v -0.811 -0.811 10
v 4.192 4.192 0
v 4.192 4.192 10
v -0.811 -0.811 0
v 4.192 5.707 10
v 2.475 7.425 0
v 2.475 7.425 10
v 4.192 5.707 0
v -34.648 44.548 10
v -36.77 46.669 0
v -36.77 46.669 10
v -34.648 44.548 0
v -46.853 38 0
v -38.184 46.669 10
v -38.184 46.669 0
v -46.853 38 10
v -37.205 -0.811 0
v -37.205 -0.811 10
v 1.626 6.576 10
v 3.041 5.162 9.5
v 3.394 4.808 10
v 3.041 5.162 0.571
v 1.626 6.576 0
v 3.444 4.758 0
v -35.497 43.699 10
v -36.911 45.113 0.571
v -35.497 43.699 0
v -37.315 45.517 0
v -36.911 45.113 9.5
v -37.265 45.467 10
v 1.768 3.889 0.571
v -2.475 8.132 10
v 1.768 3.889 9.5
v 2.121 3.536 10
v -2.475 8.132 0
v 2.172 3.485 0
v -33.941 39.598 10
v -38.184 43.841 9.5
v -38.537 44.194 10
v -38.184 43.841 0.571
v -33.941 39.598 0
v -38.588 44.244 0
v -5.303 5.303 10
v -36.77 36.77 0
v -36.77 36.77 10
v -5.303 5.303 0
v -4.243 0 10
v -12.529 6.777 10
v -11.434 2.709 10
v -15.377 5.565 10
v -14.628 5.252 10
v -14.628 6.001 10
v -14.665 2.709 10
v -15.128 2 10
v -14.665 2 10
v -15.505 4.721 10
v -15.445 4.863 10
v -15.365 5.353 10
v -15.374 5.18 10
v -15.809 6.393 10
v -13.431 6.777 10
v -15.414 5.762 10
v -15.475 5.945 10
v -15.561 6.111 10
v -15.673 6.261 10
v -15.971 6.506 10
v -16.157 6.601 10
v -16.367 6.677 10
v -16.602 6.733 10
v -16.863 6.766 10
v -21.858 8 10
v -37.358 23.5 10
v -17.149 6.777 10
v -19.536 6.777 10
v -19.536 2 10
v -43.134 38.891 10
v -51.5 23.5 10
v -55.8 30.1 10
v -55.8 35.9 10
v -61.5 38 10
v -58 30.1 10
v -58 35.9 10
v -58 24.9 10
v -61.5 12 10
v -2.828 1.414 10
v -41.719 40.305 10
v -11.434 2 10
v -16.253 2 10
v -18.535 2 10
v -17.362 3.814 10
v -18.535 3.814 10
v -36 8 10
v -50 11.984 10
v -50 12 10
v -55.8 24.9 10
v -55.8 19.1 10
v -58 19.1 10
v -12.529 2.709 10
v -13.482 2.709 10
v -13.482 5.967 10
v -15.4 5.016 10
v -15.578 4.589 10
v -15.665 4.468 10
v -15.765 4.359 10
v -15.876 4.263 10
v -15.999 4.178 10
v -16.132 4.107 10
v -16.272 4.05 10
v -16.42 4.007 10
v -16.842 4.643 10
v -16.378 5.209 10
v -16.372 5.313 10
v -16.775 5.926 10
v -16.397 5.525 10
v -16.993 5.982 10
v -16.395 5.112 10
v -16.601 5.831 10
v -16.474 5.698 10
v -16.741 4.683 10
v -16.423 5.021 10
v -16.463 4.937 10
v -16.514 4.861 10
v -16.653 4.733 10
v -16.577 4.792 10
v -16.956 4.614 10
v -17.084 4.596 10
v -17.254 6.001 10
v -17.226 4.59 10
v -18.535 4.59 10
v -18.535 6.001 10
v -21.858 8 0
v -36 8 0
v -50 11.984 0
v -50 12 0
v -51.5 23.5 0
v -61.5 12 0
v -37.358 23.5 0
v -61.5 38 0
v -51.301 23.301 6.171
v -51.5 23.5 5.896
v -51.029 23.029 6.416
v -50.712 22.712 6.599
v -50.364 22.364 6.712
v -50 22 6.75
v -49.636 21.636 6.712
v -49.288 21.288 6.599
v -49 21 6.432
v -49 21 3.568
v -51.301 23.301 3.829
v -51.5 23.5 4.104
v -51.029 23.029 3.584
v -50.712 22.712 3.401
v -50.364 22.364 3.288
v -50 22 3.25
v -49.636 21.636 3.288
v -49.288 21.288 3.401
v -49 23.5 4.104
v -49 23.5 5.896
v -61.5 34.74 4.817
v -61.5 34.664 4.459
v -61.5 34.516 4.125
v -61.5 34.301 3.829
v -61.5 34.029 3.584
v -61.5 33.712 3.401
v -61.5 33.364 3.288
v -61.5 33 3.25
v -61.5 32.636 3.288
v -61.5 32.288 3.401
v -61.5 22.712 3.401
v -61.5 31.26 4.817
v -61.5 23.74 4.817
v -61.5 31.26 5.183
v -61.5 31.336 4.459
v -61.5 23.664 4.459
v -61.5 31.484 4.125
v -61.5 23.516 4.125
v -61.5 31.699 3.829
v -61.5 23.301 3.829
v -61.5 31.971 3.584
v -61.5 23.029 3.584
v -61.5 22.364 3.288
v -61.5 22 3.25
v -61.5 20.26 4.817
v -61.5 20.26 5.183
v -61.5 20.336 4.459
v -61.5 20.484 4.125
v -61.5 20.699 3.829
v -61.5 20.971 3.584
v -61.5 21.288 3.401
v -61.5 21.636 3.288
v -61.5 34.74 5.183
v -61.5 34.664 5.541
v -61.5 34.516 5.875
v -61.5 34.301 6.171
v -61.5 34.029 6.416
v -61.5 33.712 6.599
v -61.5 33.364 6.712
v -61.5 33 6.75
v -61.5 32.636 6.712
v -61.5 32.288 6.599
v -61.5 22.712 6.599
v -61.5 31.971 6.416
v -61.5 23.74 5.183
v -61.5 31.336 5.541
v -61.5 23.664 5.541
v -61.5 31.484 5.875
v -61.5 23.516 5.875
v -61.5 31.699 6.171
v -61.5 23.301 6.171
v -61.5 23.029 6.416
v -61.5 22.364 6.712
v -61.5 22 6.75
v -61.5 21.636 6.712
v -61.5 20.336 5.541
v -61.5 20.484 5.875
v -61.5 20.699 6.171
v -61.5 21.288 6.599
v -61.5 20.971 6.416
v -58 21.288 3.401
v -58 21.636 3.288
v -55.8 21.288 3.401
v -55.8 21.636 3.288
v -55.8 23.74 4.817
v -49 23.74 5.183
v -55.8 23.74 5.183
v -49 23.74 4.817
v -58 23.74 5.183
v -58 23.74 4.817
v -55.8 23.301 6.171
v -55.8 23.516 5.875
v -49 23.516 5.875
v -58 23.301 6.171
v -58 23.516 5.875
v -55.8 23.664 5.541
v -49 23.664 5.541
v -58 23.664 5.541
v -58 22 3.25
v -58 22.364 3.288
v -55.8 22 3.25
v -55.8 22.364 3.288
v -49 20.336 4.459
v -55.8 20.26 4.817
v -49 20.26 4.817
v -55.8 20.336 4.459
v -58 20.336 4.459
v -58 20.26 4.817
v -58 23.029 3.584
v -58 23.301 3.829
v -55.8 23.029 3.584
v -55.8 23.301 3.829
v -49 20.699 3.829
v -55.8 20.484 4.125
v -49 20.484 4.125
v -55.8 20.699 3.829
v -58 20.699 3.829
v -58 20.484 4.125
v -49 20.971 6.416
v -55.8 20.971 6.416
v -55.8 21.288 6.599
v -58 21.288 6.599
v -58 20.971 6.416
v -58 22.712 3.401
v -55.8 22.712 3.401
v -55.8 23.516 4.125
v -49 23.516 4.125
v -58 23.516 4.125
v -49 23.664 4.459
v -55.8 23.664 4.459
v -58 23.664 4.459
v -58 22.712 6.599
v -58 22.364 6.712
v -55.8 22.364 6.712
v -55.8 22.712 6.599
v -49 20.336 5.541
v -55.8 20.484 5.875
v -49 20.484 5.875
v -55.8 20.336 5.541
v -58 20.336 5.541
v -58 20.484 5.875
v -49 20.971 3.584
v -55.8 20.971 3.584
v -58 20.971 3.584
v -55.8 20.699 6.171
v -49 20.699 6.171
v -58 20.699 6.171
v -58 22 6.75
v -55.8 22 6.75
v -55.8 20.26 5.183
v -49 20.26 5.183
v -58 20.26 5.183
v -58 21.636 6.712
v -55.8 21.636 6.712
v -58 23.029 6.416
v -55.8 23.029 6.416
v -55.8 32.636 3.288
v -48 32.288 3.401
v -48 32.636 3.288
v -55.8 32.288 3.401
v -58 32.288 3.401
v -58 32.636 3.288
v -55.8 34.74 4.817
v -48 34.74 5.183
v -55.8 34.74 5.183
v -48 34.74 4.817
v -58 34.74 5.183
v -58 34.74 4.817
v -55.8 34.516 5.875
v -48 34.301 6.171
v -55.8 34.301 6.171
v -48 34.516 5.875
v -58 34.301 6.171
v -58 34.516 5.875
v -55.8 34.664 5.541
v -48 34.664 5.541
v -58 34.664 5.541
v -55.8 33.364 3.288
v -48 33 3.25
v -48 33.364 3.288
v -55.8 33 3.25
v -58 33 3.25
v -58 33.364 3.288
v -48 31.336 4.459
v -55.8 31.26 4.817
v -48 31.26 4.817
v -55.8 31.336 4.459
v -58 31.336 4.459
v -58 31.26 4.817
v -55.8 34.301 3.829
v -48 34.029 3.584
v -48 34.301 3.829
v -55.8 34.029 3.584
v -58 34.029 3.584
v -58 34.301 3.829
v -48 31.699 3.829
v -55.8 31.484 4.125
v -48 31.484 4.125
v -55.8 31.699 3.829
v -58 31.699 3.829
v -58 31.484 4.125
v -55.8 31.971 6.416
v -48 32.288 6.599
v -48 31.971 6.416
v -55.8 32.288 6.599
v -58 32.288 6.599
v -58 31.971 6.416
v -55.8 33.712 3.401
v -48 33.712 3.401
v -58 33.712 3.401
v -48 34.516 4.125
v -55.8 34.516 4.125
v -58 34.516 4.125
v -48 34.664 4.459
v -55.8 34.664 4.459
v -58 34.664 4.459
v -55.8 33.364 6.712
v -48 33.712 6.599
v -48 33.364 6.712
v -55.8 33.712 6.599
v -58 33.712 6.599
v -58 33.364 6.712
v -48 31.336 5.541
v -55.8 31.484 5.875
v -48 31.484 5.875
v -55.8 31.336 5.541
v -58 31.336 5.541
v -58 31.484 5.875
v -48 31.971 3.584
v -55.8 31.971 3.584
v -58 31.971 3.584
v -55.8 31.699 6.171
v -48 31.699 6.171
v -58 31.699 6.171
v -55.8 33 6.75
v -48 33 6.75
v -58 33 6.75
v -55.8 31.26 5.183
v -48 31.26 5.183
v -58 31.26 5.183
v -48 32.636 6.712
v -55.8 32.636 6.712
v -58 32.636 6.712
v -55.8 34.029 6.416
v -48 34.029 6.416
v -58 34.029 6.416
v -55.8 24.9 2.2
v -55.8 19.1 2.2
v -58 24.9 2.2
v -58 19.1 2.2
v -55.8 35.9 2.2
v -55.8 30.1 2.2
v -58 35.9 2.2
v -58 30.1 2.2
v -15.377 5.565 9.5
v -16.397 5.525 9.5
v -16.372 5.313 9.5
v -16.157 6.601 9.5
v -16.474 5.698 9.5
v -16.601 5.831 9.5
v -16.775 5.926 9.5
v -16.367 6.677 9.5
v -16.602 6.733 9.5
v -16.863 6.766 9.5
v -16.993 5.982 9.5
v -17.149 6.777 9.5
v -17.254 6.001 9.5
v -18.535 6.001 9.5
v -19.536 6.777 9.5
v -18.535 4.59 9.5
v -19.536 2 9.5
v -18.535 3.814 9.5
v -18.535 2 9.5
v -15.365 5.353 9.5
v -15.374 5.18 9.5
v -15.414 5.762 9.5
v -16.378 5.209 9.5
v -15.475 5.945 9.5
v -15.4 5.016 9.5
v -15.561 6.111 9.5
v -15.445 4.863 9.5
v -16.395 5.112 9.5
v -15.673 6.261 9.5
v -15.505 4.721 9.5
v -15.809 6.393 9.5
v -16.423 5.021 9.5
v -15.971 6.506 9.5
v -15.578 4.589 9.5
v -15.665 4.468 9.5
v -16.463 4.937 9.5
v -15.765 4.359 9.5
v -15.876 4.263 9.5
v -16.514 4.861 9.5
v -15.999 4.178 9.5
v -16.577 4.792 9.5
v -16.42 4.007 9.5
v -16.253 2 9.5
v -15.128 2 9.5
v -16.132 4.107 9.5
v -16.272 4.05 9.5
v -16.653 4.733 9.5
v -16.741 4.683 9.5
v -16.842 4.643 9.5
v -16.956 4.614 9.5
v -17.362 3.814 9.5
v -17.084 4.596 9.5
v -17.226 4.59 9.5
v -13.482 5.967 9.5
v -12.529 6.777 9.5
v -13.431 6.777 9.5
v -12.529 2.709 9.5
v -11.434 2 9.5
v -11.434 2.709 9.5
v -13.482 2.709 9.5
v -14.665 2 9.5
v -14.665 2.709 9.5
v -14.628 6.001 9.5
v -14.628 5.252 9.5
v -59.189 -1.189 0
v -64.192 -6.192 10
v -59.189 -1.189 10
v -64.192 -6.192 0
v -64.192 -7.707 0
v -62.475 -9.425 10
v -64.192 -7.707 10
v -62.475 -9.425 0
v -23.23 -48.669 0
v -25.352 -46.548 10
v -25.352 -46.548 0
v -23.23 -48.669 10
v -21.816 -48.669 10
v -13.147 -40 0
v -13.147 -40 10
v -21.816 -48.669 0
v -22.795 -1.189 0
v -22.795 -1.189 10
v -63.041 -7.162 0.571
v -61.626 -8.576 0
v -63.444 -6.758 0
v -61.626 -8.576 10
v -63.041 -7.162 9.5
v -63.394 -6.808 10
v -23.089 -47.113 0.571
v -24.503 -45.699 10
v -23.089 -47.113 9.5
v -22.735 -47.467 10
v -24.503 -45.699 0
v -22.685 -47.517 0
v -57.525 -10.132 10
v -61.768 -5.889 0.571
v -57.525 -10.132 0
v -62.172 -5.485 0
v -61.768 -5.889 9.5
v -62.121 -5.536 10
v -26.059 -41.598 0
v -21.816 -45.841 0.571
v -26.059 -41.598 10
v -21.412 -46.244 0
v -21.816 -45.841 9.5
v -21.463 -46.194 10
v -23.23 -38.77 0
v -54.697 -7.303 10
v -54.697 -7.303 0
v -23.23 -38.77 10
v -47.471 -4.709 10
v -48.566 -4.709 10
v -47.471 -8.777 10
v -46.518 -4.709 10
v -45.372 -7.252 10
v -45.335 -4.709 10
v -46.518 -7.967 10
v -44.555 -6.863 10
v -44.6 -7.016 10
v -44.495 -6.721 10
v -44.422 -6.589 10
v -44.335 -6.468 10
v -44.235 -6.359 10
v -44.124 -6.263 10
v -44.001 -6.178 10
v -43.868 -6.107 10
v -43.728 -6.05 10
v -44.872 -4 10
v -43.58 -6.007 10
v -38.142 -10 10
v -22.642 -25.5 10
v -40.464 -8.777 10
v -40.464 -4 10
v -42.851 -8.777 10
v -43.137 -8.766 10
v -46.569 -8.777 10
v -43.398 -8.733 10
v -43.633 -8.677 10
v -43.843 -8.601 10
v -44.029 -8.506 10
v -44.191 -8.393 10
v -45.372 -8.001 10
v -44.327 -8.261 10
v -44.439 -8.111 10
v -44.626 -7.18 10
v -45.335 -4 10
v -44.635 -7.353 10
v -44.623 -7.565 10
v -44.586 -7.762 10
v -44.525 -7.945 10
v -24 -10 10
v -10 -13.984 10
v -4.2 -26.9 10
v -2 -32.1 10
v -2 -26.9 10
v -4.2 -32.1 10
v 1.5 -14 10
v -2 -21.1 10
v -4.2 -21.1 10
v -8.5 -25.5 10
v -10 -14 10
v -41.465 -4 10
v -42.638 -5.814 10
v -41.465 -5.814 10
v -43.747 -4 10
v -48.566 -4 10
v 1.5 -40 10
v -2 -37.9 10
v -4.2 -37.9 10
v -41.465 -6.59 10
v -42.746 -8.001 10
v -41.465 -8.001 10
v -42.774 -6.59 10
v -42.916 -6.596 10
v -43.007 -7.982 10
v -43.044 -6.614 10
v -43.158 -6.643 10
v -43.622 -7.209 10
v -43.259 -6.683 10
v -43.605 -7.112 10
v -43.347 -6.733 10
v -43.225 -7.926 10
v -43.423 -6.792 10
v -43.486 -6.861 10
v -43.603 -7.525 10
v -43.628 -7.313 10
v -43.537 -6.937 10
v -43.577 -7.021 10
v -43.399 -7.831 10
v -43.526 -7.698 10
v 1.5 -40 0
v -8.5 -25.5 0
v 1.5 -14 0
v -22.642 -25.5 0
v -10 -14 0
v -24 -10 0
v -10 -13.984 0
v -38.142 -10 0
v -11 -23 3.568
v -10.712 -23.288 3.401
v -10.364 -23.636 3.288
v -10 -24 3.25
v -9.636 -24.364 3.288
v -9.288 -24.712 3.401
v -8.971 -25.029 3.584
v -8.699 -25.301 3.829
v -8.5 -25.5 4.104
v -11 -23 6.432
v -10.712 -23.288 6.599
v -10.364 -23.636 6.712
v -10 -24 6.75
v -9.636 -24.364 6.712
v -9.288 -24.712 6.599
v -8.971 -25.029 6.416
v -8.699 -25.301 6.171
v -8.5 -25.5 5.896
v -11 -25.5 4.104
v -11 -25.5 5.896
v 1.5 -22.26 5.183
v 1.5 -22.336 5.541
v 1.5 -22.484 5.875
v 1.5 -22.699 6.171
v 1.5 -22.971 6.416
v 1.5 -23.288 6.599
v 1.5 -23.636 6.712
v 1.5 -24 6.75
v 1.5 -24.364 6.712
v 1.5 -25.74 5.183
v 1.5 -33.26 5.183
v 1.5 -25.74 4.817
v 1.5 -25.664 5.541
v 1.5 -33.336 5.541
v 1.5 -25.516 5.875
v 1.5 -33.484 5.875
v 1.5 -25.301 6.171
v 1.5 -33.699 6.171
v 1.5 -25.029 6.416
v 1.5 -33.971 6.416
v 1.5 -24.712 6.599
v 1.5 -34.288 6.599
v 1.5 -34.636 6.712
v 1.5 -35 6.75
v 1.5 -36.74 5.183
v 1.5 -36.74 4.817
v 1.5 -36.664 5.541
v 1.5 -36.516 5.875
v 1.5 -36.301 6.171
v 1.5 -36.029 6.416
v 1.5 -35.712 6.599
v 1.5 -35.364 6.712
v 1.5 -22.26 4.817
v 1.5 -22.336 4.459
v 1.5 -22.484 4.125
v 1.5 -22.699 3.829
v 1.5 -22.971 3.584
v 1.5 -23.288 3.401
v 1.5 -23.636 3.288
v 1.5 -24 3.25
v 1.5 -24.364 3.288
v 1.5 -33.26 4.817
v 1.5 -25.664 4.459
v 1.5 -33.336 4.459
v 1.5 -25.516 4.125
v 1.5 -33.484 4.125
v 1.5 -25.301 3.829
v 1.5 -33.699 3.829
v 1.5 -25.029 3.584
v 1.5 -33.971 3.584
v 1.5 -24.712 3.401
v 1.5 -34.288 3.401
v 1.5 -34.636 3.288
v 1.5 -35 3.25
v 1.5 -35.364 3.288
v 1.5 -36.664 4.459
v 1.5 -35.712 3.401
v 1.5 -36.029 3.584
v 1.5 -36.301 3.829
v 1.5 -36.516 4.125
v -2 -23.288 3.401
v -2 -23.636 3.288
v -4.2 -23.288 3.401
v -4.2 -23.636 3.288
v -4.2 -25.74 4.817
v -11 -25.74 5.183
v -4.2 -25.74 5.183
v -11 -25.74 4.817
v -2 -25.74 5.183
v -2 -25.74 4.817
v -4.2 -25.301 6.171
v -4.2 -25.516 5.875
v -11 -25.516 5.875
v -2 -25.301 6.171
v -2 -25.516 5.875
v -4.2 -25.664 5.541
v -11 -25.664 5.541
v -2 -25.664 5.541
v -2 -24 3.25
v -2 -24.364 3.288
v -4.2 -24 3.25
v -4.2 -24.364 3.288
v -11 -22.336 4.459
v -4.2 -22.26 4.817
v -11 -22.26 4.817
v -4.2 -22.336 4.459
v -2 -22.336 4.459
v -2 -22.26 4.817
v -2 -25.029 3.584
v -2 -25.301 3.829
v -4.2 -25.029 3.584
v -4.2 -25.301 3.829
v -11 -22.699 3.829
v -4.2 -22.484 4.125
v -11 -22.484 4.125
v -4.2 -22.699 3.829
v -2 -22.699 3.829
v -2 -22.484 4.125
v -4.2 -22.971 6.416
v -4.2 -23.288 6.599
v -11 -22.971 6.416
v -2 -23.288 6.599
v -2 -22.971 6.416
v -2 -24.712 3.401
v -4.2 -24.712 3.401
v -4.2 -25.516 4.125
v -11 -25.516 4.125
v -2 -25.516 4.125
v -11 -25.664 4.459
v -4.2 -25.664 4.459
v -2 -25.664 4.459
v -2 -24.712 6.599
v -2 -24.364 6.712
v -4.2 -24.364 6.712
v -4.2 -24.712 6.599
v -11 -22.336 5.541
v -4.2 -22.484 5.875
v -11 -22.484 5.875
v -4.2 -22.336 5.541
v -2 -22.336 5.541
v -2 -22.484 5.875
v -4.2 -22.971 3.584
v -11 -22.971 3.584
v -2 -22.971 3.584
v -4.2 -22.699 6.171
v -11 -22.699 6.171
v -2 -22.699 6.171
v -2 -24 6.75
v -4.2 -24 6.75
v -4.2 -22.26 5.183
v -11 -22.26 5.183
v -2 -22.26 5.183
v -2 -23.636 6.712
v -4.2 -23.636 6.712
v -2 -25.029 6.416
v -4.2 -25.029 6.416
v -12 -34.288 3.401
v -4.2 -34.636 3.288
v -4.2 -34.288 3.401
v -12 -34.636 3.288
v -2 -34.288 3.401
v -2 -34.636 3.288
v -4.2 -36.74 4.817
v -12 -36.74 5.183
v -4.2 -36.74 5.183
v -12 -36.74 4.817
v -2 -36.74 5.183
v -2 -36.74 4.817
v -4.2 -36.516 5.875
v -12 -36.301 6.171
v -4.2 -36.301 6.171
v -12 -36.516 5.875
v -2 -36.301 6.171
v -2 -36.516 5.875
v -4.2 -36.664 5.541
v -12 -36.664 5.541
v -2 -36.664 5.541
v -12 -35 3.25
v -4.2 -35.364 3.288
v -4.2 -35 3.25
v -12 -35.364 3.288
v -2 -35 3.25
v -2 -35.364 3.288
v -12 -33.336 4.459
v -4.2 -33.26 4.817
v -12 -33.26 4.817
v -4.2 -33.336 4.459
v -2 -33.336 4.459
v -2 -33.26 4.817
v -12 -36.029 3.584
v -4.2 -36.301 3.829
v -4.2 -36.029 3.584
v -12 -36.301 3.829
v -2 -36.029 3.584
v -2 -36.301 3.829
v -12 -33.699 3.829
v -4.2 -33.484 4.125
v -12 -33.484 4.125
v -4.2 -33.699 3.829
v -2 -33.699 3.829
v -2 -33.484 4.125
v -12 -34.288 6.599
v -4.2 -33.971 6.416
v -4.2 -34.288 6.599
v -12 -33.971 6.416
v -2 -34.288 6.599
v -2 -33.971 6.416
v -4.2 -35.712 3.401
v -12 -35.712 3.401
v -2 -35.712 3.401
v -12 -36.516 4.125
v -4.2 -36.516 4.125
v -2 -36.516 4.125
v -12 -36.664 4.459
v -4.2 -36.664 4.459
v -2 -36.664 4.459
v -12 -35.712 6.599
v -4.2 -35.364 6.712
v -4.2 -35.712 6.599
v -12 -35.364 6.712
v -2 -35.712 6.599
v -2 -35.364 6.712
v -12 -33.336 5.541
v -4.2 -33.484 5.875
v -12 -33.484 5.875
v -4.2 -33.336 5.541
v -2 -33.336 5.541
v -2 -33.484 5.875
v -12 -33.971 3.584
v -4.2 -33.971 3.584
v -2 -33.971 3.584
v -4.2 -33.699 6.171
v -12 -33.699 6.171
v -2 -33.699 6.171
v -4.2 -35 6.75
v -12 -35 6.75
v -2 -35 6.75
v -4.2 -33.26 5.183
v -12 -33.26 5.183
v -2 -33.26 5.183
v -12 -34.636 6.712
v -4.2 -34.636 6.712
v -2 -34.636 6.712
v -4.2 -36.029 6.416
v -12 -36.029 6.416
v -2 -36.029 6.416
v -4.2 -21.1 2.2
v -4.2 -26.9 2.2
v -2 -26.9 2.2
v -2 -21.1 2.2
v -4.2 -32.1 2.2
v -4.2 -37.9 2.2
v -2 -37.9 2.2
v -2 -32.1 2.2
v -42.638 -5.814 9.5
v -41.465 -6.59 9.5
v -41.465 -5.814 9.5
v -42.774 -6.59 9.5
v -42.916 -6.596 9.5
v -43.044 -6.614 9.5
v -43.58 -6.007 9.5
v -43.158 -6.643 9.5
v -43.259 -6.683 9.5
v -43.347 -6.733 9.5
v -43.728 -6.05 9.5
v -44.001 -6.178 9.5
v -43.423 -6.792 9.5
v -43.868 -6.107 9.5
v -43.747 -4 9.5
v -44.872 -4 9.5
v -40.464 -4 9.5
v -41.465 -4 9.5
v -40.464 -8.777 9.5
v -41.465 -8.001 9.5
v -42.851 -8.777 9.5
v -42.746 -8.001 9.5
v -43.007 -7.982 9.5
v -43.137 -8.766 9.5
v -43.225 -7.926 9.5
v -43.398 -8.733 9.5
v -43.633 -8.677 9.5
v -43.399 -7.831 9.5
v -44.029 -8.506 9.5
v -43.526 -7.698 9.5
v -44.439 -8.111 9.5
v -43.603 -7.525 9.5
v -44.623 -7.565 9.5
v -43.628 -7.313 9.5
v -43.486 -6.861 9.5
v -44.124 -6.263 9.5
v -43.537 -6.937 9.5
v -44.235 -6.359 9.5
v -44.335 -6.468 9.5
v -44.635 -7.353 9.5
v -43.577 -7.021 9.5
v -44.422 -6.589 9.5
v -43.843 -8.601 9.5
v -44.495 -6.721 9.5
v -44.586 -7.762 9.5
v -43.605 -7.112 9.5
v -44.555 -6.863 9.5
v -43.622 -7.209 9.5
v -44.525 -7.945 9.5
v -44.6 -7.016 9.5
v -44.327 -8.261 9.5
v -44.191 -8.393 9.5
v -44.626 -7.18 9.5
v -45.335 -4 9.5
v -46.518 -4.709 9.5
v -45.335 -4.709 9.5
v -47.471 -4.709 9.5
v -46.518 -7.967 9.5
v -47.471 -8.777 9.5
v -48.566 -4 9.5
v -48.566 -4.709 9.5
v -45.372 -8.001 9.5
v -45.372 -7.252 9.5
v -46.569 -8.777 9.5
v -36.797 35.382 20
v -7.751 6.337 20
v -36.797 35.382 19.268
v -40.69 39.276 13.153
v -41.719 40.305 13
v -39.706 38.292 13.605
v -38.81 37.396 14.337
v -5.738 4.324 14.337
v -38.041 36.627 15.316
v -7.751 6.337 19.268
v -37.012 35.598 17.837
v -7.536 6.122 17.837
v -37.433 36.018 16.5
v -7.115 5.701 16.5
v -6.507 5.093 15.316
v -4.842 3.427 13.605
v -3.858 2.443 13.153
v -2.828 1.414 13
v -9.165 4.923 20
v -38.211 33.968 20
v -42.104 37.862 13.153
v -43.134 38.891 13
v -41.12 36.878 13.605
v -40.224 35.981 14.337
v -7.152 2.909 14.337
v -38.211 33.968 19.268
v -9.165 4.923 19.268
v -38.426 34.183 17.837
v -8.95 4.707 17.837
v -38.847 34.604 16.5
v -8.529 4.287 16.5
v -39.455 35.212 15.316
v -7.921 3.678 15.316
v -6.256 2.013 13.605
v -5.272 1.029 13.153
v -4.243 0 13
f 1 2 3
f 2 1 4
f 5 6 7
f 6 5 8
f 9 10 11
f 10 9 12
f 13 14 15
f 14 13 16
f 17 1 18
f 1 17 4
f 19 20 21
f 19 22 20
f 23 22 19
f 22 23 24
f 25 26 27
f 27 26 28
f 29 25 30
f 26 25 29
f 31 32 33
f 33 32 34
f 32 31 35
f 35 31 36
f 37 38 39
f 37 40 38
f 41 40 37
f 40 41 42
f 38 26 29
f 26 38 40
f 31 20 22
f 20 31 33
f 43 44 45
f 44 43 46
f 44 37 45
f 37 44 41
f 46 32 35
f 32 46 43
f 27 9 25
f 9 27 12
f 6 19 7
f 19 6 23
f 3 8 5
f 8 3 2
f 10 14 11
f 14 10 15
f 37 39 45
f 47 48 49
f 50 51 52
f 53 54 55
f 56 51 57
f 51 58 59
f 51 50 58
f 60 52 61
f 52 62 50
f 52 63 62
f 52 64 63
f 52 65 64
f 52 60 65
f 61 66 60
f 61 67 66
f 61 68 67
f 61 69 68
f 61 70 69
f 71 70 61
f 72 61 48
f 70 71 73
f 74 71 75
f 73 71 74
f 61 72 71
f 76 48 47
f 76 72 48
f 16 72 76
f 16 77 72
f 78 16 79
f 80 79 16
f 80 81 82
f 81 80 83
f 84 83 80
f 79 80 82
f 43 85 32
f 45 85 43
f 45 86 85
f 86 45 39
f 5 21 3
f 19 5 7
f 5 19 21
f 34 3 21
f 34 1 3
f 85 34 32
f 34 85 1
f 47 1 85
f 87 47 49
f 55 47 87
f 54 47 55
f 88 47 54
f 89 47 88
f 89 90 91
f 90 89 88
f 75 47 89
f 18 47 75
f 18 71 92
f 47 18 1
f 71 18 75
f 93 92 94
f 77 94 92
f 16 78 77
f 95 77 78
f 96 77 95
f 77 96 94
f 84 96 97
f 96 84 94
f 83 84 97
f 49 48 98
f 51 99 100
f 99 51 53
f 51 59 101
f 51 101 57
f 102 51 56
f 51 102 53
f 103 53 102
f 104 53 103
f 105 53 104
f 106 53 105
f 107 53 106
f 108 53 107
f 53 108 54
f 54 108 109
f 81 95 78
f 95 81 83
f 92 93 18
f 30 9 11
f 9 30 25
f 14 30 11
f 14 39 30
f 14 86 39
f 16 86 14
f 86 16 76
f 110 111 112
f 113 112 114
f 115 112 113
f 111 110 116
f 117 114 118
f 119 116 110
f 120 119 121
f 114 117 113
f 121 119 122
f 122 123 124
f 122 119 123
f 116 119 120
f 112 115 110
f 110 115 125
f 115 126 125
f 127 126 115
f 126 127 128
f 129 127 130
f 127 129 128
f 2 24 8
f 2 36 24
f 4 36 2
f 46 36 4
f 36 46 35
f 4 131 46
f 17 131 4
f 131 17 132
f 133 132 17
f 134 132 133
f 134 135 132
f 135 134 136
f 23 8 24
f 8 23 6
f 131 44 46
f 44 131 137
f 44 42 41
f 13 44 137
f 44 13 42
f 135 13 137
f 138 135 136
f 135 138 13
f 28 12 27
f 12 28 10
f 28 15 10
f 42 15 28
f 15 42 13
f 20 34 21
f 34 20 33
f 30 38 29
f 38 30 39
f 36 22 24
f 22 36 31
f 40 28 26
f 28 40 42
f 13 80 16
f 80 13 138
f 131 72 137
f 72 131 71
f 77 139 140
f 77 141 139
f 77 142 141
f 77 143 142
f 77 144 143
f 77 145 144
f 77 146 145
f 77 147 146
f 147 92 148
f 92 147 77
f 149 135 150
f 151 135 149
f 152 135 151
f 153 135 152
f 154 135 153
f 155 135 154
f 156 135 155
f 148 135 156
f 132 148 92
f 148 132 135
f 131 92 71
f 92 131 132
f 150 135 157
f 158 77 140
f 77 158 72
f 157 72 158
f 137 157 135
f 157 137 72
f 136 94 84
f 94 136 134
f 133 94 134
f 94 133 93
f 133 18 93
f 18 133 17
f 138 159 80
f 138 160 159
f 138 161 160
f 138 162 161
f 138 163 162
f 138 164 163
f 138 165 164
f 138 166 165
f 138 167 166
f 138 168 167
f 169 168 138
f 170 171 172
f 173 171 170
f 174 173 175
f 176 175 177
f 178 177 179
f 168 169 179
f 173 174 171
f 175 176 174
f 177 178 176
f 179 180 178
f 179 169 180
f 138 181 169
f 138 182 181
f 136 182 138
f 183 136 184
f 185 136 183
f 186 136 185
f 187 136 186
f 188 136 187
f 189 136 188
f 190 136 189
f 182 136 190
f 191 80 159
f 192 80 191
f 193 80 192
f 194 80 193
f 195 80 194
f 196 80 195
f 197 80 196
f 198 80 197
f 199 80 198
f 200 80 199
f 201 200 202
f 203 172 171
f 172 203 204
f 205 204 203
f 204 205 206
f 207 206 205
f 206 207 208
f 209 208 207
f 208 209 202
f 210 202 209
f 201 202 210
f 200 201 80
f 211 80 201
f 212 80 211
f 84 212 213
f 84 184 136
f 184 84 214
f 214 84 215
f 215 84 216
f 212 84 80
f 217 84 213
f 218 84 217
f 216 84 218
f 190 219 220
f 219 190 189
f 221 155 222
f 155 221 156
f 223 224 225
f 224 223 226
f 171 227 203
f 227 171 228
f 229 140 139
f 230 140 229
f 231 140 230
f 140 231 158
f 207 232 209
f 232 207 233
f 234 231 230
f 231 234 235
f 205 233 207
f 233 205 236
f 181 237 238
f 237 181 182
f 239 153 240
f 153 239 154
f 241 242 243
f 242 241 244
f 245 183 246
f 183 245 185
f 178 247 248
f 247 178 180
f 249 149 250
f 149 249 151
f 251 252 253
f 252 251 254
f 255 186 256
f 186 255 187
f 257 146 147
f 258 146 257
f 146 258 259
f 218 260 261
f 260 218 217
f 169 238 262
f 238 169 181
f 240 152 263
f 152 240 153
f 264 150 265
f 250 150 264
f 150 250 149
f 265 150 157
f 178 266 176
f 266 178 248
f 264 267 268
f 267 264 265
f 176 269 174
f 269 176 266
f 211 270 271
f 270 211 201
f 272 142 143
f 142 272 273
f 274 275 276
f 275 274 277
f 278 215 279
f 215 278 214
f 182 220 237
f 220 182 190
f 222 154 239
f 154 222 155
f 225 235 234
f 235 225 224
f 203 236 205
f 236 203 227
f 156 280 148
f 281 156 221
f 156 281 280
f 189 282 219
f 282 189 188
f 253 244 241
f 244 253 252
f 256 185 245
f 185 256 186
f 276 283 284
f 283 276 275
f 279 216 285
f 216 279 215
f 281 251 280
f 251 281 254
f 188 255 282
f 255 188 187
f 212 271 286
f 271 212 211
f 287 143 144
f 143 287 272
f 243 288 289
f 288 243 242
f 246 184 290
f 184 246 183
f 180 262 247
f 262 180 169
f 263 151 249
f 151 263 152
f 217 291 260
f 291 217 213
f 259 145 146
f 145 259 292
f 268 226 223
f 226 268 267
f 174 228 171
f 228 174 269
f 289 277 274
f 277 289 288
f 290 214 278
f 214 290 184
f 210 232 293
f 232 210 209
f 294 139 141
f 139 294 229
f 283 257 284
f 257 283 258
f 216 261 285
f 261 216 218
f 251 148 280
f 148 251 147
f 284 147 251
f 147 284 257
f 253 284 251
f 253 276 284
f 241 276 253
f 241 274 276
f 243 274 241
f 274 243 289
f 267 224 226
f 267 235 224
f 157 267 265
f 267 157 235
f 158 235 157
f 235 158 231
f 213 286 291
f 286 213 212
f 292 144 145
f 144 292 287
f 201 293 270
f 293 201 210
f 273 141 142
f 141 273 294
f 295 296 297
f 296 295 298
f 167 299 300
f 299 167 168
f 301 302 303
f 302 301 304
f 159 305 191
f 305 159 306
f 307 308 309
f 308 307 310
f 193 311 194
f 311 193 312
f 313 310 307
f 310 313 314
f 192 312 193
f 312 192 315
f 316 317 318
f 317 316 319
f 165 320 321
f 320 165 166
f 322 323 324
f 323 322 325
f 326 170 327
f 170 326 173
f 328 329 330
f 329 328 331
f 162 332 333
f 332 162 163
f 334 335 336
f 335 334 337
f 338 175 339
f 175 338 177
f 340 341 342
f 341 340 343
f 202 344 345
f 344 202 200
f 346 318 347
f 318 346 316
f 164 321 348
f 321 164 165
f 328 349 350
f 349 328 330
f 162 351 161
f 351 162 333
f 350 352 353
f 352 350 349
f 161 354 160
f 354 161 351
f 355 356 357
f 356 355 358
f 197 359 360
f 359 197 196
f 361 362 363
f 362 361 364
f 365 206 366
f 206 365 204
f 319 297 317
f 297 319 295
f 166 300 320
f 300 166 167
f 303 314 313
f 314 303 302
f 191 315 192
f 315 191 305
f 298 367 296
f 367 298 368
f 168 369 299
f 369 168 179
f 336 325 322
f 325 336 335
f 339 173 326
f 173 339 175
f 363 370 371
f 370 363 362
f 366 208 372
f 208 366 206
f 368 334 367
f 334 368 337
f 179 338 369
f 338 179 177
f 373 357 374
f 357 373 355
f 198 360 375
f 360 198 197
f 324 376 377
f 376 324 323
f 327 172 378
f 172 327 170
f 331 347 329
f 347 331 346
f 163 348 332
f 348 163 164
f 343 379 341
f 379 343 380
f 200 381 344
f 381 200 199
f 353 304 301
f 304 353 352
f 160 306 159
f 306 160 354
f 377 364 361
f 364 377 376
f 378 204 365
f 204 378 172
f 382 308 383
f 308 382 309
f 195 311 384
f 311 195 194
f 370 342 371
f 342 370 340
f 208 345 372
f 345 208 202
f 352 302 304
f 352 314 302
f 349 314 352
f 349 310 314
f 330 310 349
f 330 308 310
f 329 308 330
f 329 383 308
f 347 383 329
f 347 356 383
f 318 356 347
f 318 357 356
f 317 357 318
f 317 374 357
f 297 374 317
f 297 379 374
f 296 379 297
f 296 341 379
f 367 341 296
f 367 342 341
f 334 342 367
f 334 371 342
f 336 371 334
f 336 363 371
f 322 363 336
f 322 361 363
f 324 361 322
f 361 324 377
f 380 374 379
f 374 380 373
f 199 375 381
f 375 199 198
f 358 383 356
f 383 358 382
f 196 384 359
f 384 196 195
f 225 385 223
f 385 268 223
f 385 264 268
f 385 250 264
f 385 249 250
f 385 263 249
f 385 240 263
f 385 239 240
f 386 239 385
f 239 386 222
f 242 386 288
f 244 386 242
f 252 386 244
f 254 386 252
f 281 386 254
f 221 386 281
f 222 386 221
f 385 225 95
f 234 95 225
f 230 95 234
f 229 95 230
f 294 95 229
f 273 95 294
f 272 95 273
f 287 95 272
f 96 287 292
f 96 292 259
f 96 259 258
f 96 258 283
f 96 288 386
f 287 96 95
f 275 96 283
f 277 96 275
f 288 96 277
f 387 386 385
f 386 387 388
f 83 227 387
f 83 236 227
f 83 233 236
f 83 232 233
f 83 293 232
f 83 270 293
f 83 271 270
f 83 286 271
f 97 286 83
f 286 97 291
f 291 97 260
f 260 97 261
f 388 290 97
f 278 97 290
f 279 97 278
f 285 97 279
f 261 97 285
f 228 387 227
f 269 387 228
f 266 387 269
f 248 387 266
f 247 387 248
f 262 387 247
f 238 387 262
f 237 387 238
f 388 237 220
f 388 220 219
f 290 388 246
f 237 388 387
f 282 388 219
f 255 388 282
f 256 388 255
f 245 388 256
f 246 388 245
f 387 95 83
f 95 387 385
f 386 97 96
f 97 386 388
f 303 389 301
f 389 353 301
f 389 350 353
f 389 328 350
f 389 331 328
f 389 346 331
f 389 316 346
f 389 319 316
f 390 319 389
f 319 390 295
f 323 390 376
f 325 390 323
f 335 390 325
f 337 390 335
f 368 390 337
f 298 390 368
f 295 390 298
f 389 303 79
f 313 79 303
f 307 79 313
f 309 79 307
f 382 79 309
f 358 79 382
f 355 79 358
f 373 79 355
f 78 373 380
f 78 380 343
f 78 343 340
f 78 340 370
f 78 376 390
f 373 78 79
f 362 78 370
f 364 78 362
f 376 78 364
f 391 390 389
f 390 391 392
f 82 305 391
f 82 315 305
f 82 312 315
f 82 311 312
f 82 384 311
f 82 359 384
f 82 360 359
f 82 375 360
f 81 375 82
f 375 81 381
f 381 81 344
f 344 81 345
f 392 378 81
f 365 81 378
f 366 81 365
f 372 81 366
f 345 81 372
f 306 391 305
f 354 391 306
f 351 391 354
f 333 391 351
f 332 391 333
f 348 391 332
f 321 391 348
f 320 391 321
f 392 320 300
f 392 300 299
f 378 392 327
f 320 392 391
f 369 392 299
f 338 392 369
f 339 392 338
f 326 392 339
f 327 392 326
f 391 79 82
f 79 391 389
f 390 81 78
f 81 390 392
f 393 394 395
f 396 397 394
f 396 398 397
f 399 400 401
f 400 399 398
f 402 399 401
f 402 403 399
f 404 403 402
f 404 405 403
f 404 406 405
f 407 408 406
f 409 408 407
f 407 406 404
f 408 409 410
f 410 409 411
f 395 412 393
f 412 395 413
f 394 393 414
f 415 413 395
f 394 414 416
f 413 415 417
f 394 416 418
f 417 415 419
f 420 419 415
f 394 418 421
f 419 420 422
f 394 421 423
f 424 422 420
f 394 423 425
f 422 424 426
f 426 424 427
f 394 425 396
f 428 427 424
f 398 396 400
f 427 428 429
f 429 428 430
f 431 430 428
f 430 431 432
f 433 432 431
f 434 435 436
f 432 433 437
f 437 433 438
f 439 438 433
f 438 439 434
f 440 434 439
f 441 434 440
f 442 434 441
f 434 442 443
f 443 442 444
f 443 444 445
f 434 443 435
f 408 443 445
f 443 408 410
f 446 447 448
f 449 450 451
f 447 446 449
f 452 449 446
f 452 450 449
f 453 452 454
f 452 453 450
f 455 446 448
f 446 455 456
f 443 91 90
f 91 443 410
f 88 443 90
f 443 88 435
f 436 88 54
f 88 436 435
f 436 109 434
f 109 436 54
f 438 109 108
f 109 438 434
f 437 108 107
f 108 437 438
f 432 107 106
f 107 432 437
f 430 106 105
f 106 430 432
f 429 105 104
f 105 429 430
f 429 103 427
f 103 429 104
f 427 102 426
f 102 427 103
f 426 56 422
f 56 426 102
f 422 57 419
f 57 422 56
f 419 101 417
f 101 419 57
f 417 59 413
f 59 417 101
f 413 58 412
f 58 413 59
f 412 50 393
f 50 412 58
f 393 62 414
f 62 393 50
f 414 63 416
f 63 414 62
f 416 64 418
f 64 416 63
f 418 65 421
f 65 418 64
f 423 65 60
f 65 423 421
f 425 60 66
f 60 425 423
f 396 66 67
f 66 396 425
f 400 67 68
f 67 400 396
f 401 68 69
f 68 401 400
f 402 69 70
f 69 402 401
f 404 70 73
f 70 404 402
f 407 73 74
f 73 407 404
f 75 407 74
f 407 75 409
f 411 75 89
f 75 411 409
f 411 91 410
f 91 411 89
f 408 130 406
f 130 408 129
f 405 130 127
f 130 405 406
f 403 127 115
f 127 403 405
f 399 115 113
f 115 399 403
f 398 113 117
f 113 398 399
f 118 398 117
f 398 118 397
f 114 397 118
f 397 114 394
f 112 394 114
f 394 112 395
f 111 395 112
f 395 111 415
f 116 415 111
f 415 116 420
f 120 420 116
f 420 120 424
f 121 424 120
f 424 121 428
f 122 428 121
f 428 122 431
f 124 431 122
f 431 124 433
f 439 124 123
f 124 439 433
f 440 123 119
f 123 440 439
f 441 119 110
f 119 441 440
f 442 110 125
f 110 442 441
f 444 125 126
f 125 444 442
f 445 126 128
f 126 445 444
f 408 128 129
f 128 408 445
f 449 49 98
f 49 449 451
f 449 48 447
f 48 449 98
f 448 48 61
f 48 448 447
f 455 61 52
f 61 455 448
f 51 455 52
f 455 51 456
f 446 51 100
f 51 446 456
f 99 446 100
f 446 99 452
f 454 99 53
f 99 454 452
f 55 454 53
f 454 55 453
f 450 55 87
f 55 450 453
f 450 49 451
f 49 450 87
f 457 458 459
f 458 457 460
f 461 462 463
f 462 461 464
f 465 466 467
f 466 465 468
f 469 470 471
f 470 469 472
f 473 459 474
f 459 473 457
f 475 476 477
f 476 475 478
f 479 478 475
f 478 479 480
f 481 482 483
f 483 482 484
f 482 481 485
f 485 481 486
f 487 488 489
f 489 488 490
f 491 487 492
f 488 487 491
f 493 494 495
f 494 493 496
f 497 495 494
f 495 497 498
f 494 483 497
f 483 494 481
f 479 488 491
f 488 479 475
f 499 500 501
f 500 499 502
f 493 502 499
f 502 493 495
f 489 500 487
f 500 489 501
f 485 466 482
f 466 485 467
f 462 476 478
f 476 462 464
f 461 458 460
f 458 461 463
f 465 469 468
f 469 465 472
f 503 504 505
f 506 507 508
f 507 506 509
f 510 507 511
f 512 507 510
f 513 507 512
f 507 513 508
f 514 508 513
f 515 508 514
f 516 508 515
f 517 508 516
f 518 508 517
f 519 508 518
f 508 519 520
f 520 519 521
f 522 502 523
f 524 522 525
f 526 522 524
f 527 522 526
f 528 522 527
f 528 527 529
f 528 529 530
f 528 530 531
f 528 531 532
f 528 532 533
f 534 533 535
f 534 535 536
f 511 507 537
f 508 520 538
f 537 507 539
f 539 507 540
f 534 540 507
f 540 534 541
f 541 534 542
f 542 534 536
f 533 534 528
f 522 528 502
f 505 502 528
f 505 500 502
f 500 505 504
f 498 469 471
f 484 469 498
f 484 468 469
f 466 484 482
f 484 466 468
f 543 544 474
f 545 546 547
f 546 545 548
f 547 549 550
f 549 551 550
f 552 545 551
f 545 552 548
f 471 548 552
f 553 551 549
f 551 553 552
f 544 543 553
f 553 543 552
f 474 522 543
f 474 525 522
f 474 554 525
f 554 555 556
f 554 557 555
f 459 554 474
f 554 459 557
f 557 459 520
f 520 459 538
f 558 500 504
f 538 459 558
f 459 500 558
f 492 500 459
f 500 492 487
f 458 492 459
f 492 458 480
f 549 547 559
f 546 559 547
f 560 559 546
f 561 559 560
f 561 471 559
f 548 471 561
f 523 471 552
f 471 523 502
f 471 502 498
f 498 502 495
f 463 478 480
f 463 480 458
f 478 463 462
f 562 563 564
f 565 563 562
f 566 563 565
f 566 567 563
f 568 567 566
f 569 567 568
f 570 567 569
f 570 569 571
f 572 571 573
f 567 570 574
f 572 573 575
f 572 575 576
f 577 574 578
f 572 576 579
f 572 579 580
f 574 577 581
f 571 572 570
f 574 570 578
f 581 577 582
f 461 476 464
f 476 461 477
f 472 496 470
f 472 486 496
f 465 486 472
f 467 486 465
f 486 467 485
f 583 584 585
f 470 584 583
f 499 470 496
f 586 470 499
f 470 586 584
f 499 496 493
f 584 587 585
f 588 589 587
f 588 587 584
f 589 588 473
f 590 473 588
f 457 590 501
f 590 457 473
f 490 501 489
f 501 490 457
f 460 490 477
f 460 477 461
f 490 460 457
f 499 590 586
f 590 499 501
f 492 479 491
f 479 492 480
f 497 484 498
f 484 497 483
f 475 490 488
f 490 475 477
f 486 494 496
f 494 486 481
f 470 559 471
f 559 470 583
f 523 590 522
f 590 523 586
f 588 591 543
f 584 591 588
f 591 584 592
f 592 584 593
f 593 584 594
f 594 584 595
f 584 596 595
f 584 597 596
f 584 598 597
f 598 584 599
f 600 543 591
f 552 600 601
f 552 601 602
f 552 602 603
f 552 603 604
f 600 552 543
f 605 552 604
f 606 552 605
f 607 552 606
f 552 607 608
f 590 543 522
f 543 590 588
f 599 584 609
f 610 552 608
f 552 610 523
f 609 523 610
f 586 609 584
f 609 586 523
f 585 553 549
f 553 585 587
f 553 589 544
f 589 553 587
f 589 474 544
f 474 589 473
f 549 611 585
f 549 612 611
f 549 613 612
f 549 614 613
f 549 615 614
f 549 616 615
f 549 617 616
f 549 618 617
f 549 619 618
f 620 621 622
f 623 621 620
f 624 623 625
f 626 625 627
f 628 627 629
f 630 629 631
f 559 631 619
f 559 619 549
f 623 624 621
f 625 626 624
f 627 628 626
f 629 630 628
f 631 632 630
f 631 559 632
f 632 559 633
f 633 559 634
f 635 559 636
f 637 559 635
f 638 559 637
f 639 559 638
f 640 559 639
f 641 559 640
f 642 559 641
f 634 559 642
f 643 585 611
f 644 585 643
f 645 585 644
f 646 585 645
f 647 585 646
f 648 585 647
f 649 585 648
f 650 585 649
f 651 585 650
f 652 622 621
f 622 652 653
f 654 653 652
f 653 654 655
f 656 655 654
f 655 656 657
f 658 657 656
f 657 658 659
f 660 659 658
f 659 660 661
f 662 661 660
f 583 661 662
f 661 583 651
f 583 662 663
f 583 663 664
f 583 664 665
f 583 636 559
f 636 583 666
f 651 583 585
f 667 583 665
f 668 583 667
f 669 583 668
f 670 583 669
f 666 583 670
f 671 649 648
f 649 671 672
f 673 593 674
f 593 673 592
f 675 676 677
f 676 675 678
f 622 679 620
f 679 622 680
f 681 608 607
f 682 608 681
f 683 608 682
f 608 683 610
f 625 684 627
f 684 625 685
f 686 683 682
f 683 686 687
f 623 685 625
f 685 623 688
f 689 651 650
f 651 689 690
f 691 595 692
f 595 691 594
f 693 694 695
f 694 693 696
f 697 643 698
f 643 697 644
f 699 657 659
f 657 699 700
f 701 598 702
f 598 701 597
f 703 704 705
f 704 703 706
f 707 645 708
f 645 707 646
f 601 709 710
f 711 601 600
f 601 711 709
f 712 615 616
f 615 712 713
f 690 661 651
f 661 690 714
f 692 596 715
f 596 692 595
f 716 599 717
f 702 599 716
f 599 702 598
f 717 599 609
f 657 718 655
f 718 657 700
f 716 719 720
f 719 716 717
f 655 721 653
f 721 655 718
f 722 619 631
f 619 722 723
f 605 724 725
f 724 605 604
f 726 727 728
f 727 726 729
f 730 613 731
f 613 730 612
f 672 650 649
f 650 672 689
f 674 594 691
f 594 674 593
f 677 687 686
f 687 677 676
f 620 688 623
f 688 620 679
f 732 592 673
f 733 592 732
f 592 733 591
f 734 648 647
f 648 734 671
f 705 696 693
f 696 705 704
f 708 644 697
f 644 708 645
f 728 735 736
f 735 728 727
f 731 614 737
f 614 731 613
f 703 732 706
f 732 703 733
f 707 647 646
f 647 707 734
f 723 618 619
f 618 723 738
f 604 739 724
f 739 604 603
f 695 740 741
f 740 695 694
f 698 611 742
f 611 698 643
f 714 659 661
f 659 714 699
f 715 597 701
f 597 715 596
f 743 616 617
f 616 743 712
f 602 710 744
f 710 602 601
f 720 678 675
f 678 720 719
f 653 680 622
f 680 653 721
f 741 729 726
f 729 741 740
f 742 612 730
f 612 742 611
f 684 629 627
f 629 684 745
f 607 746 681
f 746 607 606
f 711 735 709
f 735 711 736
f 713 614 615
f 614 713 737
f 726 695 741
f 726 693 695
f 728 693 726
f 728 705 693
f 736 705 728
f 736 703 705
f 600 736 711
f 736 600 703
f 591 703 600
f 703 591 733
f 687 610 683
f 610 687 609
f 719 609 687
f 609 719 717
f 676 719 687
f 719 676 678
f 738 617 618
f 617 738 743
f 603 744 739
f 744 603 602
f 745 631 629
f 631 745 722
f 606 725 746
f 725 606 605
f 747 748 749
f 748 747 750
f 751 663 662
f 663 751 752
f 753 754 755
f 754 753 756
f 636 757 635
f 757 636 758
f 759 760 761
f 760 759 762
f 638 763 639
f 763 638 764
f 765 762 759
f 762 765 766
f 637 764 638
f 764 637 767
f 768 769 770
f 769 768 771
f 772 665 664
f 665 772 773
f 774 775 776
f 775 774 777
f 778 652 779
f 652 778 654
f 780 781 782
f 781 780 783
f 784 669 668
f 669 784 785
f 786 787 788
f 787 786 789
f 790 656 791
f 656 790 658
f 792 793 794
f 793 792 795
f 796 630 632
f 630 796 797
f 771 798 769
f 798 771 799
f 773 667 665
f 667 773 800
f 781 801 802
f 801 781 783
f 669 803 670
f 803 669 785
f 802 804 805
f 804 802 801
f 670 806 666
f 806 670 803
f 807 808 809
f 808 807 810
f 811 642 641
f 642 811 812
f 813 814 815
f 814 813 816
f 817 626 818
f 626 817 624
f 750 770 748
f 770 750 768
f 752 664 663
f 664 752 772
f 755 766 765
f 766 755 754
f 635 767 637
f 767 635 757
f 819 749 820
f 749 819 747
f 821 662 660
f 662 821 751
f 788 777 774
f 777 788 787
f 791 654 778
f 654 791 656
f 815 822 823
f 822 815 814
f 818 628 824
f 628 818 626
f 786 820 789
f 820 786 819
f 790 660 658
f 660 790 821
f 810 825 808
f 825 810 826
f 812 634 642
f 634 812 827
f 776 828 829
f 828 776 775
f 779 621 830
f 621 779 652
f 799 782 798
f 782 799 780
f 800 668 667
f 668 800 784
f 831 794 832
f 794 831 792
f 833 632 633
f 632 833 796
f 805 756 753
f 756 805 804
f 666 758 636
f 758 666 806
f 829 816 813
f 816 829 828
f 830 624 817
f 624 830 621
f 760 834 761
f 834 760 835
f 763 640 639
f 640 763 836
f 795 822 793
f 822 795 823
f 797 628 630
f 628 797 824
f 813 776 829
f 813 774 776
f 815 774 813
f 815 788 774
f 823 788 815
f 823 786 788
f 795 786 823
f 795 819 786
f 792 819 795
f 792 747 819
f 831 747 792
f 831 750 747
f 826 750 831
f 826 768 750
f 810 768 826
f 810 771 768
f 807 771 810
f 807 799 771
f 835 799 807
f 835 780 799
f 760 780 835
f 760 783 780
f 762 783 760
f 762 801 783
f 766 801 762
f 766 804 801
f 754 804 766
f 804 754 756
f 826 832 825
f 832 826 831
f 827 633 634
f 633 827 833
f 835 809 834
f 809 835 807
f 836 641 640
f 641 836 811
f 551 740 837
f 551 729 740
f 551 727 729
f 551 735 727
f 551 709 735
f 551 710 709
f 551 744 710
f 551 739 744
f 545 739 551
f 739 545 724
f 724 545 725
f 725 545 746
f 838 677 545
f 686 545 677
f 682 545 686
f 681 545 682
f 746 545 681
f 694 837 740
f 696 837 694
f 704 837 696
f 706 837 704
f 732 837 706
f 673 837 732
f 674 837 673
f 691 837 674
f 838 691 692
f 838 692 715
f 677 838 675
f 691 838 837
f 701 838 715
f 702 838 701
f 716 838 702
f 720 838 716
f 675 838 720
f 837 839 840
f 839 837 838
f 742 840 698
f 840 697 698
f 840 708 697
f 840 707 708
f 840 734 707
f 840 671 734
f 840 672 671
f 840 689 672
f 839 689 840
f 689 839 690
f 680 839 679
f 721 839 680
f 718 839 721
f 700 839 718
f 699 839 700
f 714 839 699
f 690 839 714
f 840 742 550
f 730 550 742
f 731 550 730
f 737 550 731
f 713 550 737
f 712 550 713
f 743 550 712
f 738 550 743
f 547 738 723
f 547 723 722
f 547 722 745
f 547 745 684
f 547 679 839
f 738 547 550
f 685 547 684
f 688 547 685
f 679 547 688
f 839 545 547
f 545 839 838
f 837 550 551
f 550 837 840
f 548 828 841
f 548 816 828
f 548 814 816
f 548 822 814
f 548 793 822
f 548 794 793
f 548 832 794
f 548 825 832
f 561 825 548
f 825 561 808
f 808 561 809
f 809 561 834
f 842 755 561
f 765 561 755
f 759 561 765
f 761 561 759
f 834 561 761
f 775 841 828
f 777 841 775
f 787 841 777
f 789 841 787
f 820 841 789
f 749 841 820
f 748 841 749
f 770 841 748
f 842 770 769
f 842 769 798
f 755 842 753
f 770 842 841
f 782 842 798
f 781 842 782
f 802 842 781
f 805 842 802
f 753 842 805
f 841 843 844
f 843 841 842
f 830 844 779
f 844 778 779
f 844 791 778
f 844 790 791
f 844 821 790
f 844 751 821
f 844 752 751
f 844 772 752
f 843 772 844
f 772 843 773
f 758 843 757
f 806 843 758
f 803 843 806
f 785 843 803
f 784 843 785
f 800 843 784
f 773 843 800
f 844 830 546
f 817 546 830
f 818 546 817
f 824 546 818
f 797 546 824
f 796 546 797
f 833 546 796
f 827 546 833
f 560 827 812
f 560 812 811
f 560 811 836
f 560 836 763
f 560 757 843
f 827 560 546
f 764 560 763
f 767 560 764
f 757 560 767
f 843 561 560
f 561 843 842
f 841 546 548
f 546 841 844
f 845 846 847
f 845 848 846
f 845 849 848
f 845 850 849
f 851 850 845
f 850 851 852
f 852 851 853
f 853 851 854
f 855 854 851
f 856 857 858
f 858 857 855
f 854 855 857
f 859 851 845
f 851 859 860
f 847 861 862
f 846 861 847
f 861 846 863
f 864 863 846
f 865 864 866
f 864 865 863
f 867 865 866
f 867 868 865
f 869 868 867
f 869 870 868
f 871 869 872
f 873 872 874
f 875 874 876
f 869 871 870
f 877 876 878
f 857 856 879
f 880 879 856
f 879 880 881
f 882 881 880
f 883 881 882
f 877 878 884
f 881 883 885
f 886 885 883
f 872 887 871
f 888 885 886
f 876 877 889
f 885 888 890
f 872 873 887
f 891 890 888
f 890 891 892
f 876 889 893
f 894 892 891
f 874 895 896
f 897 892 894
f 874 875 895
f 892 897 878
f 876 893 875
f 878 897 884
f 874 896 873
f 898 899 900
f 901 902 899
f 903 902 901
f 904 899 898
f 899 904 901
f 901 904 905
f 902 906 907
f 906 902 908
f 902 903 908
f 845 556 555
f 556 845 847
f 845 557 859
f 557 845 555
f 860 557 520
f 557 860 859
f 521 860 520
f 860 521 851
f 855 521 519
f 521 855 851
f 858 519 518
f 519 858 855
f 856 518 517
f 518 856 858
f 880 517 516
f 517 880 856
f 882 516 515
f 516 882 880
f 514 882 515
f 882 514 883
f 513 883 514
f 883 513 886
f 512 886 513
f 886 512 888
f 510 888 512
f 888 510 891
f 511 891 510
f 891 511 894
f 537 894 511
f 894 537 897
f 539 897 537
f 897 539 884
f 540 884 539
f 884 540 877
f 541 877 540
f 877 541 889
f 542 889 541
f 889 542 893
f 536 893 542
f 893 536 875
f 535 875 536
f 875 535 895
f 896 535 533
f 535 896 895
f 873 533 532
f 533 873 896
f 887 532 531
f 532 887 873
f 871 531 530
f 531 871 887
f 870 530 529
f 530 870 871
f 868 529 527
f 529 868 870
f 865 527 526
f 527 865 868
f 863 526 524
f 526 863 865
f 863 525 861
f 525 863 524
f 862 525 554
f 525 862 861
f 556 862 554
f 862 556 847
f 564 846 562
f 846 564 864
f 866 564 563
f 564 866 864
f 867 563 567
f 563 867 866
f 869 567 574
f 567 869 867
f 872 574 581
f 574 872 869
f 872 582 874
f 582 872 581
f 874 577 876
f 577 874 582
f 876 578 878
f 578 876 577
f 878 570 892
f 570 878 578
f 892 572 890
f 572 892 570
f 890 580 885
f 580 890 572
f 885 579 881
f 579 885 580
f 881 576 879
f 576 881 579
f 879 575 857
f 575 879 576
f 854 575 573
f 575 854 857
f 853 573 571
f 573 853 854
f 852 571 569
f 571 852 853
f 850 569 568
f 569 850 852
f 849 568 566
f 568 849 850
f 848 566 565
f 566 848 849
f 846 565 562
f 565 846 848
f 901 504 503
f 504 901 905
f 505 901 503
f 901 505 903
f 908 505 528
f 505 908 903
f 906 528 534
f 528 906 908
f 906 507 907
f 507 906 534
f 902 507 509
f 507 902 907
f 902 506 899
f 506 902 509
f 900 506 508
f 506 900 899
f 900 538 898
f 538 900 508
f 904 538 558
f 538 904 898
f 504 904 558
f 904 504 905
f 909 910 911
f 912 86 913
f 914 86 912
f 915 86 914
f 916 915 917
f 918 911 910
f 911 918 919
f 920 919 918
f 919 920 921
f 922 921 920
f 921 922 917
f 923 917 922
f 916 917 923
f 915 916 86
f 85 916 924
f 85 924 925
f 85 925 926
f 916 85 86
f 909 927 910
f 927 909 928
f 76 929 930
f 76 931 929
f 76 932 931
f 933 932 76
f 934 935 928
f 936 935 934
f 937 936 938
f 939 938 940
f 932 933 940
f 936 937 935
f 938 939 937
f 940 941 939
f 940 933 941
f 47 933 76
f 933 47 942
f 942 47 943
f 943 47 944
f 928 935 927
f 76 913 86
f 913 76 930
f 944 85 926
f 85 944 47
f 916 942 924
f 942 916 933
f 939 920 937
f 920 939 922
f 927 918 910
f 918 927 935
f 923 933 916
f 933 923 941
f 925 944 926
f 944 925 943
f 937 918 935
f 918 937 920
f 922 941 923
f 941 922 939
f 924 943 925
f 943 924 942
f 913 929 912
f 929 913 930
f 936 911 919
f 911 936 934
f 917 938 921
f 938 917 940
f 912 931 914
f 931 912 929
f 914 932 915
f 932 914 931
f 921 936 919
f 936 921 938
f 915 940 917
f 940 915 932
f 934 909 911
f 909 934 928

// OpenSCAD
// PRUSA iteration4
// lcd supports
// GNU GPL v3
// Josef Průša <iam@josefprusa.cz> and contributors
// http://www.reprap.org/wiki/Prusa_Mendel
// http://prusamendel.org

module body(){
    difference() {
        // Base block
        translate([-55,-2,0]) cube([69,81,10]);
        union (){
            // Outer body shape
            translate([-69.6,32,-1]) rotate([0,0,45]) cube([60,53,15]);
            translate([13.7,89.7,-1]) rotate([0,0,135]) cube([60,42,15]);
            translate([-19,-9,-1]) cube([60,9,15] );
            translate([7,-3,-1]) cube([60,68,16]);
            translate([-16,60,-1]) cube([60,50,15] );
            translate([-41, -45,-1]) rotate([0,0,45]) cube([60,80,13]);

            // Pcb cout out
            translate([4,1.5,-1]) cube([1.8,56.5,17]);
            translate([0,7.5,-1]) cube([5.8,44.5,17]);
            translate([4.8,3.5,-1]) cube([5.8,52.5,17]);
            translate([8,-5,-1] ) rotate([0,0,45]) cube([5,5,17]);
            translate([8,58,-1]) rotate([0,0,45]) cube([5,5,17]);
        }

        // Pcb inserts
        translate([4,3,8]) rotate([45,0,0]) cube([1.8,5,5]);
        translate([4,56.5,8]) rotate([45,0,0]) cube([1.8,5,5]);
        translate([4,3,-5]) rotate([45,0,0]) cube([1.8,5,5]);
        translate([4,56.5,-5]) rotate([45,0,0]) cube([1.8,5,5]);
    }
}

module support(){
    difference(){
        union(){
            rotate([0,0,45]) body();
            // Screw block
            translate([-72,22,0])  cube([30,16,10]);
        }

        // Lower angled part cut
        translate([-75,-2,-1])  cube([20,14,15]);
        translate([-70,-2,-1]) cube([20,14,15]);
        translate([-50,-16.3,-1]) rotate([0,0,45]) cube([20,20,15]);

        translate([-76.5,-2,-1]) cube([15,40,15]);

        difference(){
            translate([-28,0,-1]) rotate([0,0,45]) cube([10,40,15]);
            translate([-38,-12,-1]) cube([20,20,15]);
            translate([-58,23.5,-1]) cube([25,25,15]);
        }

        // Screw holes
        translate([-71,18+4,5]) rotate([0,90,0]) cylinder(h=22,r=1.75,$fn=30);
        translate([-70,29+4,5]) rotate([0,90,0]) cylinder(h=22,r=1.75,$fn=30);

        // Nut traps
        translate([-58,15.1+4,5-2.8]) cube([2.2,5.8,29.7]);
        translate([-58,26.1+4,5-2.8]) cube([2.2,5.8,29.7]);

        // version
        translate([-20,2,9.5]) rotate([0,0,0]) linear_extrude(height=0.6){
            text("R1",font = "helvetica:style=Bold", size=5);
        }
    }
}

module left_lcd_support(){
    support();

    rotate([0,0,45]) difference(){
        // Sd card shield
        translate([-3,3,10]) cube([2,55,10]);
        translate([-4,3,20]) rotate([0,90,0]) cylinder(h=4,r=7,$fn=30);
        translate([-4,58,20]) rotate([0,90,0]) cylinder(h=4,r=7,$fn=30);
    }
}

translate([-60,-2,0]) rotate([0,0,180]) support();
left_lcd_support();
